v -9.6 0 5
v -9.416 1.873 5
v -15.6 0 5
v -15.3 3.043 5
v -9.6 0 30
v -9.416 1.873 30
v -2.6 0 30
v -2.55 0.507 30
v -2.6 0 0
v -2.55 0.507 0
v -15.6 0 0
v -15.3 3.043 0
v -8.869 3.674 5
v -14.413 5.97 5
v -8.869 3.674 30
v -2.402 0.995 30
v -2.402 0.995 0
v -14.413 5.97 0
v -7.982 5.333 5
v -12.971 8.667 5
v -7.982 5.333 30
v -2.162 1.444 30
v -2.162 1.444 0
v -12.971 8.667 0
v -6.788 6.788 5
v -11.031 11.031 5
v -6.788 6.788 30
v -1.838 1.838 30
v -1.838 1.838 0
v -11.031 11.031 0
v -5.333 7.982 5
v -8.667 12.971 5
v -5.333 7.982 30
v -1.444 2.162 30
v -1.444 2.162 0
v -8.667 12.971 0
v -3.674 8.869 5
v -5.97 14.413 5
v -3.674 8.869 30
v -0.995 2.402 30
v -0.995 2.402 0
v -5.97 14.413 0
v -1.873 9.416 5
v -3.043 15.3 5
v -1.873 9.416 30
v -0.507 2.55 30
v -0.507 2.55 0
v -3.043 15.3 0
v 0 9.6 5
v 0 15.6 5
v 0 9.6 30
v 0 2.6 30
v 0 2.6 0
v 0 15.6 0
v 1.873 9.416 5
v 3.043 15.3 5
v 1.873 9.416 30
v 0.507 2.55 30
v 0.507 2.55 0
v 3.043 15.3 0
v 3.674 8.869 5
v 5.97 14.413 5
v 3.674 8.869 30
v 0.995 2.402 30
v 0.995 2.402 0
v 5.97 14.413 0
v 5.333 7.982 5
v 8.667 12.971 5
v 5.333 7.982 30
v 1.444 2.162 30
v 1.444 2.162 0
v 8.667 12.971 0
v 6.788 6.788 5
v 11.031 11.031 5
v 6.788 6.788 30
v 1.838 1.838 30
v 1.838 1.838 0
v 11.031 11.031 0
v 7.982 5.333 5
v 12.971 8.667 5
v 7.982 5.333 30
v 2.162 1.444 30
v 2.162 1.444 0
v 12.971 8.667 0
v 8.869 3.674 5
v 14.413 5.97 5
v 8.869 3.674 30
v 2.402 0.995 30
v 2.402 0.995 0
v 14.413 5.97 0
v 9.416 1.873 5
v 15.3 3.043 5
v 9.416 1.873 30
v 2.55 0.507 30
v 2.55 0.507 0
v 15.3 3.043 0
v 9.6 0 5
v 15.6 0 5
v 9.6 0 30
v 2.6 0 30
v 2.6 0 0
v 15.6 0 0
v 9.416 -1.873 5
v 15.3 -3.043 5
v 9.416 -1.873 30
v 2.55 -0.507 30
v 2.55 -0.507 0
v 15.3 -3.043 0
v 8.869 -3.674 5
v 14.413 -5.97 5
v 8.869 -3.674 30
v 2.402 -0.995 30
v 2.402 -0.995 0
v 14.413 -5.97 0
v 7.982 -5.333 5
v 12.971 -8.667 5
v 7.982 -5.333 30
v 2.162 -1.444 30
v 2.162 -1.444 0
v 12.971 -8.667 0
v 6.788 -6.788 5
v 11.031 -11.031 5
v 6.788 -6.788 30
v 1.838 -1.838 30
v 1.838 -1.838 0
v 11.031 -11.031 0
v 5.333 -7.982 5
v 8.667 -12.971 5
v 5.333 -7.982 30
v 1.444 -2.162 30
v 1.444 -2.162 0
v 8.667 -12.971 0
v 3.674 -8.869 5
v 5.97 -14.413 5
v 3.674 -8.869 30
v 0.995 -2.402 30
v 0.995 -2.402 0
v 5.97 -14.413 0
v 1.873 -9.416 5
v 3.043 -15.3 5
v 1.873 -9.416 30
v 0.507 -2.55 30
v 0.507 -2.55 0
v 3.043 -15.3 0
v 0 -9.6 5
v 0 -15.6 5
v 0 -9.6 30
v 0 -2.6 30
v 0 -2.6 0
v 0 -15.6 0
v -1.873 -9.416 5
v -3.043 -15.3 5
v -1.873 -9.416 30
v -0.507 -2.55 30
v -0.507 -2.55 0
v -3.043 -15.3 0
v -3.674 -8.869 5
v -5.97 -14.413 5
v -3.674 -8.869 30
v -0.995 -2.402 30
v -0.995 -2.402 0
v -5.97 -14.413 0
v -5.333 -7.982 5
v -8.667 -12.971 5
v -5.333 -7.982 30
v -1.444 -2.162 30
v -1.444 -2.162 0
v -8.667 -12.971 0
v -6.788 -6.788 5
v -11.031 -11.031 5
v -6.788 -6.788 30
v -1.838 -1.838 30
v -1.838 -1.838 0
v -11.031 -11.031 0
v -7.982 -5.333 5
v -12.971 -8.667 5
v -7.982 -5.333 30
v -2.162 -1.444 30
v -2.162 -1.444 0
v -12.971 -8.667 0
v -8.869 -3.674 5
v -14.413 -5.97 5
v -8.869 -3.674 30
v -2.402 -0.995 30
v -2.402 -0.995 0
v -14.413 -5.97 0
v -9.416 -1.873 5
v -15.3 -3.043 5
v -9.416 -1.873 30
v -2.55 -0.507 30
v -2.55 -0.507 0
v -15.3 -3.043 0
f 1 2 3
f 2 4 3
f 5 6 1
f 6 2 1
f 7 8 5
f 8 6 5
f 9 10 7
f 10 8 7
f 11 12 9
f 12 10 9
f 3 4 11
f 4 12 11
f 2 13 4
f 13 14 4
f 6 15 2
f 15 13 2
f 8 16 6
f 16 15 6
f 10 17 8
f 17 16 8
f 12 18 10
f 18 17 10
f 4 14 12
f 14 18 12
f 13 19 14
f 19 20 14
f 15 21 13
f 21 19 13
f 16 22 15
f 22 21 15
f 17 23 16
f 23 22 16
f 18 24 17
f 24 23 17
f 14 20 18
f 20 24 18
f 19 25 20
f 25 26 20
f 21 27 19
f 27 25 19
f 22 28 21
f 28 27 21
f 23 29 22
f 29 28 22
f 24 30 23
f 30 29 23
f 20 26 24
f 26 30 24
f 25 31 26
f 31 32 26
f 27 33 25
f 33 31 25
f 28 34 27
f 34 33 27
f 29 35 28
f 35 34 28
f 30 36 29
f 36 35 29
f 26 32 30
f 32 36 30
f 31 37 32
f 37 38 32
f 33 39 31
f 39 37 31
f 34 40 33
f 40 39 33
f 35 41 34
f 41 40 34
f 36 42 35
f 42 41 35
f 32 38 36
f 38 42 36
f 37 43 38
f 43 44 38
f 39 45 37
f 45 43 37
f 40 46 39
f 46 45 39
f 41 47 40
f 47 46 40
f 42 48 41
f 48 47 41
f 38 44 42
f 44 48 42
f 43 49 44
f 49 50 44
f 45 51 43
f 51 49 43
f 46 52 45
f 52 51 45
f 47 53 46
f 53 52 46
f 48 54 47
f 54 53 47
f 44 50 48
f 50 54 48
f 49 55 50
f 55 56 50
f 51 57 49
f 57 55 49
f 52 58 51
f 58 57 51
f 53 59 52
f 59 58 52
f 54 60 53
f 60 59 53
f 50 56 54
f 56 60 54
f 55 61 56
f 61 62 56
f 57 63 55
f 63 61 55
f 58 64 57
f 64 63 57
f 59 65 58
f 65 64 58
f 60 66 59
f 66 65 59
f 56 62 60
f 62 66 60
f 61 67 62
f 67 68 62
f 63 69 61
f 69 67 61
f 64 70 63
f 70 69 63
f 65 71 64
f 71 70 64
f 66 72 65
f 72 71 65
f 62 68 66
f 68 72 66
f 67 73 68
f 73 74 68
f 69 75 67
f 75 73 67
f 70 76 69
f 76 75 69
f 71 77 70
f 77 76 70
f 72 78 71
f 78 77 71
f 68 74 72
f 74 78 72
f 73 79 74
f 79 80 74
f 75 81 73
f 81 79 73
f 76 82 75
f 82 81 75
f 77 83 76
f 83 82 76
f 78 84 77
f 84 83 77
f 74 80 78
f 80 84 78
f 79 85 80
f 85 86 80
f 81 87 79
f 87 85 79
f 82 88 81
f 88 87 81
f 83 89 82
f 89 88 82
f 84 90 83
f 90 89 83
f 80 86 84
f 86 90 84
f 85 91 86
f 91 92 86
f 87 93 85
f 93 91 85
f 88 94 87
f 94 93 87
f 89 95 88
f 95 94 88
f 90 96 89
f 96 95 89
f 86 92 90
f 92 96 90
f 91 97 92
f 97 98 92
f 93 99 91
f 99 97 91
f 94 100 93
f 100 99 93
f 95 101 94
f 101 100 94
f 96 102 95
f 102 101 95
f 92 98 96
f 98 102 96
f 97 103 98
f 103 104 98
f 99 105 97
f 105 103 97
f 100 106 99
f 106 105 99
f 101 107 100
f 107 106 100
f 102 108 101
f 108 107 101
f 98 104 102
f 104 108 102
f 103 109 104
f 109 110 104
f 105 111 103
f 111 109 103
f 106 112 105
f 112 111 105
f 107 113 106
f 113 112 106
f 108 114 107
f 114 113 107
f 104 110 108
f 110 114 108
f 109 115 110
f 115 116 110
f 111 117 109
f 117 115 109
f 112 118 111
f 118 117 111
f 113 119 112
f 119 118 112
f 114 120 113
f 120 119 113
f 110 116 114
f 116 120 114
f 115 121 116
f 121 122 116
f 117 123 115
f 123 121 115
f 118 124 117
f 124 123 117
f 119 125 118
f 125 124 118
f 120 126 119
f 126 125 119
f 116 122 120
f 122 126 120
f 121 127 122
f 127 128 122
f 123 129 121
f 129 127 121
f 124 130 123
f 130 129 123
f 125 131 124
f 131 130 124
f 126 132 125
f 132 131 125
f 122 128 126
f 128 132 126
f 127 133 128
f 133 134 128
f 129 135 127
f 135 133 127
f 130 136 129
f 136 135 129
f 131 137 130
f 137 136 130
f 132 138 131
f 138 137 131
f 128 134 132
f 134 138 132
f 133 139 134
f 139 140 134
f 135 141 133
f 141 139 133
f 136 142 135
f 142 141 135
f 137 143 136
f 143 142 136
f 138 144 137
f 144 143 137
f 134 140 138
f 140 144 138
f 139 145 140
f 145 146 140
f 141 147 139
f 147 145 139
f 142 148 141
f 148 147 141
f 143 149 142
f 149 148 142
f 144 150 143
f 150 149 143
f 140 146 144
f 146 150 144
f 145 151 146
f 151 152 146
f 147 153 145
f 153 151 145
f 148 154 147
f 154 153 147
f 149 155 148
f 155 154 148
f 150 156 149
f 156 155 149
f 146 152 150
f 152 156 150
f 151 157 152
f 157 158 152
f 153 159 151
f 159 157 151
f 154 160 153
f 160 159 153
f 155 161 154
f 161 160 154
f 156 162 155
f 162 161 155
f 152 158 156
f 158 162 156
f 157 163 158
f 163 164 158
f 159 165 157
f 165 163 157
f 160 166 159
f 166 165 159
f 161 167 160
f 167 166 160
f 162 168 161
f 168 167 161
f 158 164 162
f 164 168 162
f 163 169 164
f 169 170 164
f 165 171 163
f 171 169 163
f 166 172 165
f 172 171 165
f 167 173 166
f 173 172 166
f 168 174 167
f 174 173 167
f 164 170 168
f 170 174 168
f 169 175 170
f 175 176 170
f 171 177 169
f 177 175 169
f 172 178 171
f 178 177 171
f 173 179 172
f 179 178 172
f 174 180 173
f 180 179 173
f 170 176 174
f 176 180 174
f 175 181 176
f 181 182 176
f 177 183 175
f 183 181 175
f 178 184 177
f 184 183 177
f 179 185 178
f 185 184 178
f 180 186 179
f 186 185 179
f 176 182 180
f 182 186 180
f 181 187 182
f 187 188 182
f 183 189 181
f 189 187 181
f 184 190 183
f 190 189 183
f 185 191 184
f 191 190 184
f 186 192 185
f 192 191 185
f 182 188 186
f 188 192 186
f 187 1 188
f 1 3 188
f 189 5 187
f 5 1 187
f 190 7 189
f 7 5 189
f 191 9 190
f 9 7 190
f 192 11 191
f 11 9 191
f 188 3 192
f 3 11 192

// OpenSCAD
$fn = 32;

// ----------------------------------------------------------------------
// Profiled standoff: flanged spacer, 30 mm long, bore 5.2 mm
// ----------------------------------------------------------------------

// --- parameters (mm) ---
revolve_angle = 360;      // full turn around the Z axis
profile_points = 6;       // points of the closed outline

profile = [[2.6, 0], [15.6, 0], [15.6, 5], [9.6, 5], [9.6, 30], [2.6, 30]];  // single closed polygon, 6 points, counter clockwise

// --- the one profile operation ---
rotate_extrude(angle = revolve_angle) polygon(points = profile);
